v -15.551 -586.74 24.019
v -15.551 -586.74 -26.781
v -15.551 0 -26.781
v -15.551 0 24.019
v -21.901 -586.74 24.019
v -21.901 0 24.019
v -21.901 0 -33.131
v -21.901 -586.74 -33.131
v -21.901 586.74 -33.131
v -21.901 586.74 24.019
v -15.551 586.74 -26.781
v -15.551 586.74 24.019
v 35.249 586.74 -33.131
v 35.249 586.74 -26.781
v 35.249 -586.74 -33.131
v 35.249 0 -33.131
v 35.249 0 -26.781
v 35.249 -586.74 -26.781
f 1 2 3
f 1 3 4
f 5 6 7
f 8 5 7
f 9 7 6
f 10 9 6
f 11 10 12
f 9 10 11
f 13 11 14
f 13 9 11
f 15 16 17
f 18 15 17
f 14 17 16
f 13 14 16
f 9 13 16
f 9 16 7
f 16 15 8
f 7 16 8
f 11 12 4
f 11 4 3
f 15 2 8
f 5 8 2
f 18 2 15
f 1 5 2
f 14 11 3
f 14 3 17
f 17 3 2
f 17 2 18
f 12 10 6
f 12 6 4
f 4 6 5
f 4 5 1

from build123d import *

# Parameters (mm, degrees)
F1_DEPTH = 586.74
F2_DEPTH = 586.74


with BuildPart() as f1:
    # F0 (on Front) → F1 (new body)
    with BuildSketch(Plane.XZ):
        Polygon((-15.55056, -26.781248), (-15.55056, 24.018752), (-21.90056, 24.018752), (-21.90056, -33.131248), (35.24944, -33.131248), (35.24944, -26.781248), align=None)
    extrude(amount=F1_DEPTH)

    # F1_face (on face) → F2 (join)
    with BuildSketch(Plane(origin=(-5.278502, 0, -16.509189), x_dir=(1, 0, 0), z_dir=(0, 1, 0))):
        Polygon((-10.272059, -40.527941), (-10.272059, 10.272059), (40.527941, 10.272059), (40.527941, 16.622059), (-16.622059, 16.622059), (-16.622059, -40.527941), align=None)
    extrude(amount=F2_DEPTH)


solid = f1.part
